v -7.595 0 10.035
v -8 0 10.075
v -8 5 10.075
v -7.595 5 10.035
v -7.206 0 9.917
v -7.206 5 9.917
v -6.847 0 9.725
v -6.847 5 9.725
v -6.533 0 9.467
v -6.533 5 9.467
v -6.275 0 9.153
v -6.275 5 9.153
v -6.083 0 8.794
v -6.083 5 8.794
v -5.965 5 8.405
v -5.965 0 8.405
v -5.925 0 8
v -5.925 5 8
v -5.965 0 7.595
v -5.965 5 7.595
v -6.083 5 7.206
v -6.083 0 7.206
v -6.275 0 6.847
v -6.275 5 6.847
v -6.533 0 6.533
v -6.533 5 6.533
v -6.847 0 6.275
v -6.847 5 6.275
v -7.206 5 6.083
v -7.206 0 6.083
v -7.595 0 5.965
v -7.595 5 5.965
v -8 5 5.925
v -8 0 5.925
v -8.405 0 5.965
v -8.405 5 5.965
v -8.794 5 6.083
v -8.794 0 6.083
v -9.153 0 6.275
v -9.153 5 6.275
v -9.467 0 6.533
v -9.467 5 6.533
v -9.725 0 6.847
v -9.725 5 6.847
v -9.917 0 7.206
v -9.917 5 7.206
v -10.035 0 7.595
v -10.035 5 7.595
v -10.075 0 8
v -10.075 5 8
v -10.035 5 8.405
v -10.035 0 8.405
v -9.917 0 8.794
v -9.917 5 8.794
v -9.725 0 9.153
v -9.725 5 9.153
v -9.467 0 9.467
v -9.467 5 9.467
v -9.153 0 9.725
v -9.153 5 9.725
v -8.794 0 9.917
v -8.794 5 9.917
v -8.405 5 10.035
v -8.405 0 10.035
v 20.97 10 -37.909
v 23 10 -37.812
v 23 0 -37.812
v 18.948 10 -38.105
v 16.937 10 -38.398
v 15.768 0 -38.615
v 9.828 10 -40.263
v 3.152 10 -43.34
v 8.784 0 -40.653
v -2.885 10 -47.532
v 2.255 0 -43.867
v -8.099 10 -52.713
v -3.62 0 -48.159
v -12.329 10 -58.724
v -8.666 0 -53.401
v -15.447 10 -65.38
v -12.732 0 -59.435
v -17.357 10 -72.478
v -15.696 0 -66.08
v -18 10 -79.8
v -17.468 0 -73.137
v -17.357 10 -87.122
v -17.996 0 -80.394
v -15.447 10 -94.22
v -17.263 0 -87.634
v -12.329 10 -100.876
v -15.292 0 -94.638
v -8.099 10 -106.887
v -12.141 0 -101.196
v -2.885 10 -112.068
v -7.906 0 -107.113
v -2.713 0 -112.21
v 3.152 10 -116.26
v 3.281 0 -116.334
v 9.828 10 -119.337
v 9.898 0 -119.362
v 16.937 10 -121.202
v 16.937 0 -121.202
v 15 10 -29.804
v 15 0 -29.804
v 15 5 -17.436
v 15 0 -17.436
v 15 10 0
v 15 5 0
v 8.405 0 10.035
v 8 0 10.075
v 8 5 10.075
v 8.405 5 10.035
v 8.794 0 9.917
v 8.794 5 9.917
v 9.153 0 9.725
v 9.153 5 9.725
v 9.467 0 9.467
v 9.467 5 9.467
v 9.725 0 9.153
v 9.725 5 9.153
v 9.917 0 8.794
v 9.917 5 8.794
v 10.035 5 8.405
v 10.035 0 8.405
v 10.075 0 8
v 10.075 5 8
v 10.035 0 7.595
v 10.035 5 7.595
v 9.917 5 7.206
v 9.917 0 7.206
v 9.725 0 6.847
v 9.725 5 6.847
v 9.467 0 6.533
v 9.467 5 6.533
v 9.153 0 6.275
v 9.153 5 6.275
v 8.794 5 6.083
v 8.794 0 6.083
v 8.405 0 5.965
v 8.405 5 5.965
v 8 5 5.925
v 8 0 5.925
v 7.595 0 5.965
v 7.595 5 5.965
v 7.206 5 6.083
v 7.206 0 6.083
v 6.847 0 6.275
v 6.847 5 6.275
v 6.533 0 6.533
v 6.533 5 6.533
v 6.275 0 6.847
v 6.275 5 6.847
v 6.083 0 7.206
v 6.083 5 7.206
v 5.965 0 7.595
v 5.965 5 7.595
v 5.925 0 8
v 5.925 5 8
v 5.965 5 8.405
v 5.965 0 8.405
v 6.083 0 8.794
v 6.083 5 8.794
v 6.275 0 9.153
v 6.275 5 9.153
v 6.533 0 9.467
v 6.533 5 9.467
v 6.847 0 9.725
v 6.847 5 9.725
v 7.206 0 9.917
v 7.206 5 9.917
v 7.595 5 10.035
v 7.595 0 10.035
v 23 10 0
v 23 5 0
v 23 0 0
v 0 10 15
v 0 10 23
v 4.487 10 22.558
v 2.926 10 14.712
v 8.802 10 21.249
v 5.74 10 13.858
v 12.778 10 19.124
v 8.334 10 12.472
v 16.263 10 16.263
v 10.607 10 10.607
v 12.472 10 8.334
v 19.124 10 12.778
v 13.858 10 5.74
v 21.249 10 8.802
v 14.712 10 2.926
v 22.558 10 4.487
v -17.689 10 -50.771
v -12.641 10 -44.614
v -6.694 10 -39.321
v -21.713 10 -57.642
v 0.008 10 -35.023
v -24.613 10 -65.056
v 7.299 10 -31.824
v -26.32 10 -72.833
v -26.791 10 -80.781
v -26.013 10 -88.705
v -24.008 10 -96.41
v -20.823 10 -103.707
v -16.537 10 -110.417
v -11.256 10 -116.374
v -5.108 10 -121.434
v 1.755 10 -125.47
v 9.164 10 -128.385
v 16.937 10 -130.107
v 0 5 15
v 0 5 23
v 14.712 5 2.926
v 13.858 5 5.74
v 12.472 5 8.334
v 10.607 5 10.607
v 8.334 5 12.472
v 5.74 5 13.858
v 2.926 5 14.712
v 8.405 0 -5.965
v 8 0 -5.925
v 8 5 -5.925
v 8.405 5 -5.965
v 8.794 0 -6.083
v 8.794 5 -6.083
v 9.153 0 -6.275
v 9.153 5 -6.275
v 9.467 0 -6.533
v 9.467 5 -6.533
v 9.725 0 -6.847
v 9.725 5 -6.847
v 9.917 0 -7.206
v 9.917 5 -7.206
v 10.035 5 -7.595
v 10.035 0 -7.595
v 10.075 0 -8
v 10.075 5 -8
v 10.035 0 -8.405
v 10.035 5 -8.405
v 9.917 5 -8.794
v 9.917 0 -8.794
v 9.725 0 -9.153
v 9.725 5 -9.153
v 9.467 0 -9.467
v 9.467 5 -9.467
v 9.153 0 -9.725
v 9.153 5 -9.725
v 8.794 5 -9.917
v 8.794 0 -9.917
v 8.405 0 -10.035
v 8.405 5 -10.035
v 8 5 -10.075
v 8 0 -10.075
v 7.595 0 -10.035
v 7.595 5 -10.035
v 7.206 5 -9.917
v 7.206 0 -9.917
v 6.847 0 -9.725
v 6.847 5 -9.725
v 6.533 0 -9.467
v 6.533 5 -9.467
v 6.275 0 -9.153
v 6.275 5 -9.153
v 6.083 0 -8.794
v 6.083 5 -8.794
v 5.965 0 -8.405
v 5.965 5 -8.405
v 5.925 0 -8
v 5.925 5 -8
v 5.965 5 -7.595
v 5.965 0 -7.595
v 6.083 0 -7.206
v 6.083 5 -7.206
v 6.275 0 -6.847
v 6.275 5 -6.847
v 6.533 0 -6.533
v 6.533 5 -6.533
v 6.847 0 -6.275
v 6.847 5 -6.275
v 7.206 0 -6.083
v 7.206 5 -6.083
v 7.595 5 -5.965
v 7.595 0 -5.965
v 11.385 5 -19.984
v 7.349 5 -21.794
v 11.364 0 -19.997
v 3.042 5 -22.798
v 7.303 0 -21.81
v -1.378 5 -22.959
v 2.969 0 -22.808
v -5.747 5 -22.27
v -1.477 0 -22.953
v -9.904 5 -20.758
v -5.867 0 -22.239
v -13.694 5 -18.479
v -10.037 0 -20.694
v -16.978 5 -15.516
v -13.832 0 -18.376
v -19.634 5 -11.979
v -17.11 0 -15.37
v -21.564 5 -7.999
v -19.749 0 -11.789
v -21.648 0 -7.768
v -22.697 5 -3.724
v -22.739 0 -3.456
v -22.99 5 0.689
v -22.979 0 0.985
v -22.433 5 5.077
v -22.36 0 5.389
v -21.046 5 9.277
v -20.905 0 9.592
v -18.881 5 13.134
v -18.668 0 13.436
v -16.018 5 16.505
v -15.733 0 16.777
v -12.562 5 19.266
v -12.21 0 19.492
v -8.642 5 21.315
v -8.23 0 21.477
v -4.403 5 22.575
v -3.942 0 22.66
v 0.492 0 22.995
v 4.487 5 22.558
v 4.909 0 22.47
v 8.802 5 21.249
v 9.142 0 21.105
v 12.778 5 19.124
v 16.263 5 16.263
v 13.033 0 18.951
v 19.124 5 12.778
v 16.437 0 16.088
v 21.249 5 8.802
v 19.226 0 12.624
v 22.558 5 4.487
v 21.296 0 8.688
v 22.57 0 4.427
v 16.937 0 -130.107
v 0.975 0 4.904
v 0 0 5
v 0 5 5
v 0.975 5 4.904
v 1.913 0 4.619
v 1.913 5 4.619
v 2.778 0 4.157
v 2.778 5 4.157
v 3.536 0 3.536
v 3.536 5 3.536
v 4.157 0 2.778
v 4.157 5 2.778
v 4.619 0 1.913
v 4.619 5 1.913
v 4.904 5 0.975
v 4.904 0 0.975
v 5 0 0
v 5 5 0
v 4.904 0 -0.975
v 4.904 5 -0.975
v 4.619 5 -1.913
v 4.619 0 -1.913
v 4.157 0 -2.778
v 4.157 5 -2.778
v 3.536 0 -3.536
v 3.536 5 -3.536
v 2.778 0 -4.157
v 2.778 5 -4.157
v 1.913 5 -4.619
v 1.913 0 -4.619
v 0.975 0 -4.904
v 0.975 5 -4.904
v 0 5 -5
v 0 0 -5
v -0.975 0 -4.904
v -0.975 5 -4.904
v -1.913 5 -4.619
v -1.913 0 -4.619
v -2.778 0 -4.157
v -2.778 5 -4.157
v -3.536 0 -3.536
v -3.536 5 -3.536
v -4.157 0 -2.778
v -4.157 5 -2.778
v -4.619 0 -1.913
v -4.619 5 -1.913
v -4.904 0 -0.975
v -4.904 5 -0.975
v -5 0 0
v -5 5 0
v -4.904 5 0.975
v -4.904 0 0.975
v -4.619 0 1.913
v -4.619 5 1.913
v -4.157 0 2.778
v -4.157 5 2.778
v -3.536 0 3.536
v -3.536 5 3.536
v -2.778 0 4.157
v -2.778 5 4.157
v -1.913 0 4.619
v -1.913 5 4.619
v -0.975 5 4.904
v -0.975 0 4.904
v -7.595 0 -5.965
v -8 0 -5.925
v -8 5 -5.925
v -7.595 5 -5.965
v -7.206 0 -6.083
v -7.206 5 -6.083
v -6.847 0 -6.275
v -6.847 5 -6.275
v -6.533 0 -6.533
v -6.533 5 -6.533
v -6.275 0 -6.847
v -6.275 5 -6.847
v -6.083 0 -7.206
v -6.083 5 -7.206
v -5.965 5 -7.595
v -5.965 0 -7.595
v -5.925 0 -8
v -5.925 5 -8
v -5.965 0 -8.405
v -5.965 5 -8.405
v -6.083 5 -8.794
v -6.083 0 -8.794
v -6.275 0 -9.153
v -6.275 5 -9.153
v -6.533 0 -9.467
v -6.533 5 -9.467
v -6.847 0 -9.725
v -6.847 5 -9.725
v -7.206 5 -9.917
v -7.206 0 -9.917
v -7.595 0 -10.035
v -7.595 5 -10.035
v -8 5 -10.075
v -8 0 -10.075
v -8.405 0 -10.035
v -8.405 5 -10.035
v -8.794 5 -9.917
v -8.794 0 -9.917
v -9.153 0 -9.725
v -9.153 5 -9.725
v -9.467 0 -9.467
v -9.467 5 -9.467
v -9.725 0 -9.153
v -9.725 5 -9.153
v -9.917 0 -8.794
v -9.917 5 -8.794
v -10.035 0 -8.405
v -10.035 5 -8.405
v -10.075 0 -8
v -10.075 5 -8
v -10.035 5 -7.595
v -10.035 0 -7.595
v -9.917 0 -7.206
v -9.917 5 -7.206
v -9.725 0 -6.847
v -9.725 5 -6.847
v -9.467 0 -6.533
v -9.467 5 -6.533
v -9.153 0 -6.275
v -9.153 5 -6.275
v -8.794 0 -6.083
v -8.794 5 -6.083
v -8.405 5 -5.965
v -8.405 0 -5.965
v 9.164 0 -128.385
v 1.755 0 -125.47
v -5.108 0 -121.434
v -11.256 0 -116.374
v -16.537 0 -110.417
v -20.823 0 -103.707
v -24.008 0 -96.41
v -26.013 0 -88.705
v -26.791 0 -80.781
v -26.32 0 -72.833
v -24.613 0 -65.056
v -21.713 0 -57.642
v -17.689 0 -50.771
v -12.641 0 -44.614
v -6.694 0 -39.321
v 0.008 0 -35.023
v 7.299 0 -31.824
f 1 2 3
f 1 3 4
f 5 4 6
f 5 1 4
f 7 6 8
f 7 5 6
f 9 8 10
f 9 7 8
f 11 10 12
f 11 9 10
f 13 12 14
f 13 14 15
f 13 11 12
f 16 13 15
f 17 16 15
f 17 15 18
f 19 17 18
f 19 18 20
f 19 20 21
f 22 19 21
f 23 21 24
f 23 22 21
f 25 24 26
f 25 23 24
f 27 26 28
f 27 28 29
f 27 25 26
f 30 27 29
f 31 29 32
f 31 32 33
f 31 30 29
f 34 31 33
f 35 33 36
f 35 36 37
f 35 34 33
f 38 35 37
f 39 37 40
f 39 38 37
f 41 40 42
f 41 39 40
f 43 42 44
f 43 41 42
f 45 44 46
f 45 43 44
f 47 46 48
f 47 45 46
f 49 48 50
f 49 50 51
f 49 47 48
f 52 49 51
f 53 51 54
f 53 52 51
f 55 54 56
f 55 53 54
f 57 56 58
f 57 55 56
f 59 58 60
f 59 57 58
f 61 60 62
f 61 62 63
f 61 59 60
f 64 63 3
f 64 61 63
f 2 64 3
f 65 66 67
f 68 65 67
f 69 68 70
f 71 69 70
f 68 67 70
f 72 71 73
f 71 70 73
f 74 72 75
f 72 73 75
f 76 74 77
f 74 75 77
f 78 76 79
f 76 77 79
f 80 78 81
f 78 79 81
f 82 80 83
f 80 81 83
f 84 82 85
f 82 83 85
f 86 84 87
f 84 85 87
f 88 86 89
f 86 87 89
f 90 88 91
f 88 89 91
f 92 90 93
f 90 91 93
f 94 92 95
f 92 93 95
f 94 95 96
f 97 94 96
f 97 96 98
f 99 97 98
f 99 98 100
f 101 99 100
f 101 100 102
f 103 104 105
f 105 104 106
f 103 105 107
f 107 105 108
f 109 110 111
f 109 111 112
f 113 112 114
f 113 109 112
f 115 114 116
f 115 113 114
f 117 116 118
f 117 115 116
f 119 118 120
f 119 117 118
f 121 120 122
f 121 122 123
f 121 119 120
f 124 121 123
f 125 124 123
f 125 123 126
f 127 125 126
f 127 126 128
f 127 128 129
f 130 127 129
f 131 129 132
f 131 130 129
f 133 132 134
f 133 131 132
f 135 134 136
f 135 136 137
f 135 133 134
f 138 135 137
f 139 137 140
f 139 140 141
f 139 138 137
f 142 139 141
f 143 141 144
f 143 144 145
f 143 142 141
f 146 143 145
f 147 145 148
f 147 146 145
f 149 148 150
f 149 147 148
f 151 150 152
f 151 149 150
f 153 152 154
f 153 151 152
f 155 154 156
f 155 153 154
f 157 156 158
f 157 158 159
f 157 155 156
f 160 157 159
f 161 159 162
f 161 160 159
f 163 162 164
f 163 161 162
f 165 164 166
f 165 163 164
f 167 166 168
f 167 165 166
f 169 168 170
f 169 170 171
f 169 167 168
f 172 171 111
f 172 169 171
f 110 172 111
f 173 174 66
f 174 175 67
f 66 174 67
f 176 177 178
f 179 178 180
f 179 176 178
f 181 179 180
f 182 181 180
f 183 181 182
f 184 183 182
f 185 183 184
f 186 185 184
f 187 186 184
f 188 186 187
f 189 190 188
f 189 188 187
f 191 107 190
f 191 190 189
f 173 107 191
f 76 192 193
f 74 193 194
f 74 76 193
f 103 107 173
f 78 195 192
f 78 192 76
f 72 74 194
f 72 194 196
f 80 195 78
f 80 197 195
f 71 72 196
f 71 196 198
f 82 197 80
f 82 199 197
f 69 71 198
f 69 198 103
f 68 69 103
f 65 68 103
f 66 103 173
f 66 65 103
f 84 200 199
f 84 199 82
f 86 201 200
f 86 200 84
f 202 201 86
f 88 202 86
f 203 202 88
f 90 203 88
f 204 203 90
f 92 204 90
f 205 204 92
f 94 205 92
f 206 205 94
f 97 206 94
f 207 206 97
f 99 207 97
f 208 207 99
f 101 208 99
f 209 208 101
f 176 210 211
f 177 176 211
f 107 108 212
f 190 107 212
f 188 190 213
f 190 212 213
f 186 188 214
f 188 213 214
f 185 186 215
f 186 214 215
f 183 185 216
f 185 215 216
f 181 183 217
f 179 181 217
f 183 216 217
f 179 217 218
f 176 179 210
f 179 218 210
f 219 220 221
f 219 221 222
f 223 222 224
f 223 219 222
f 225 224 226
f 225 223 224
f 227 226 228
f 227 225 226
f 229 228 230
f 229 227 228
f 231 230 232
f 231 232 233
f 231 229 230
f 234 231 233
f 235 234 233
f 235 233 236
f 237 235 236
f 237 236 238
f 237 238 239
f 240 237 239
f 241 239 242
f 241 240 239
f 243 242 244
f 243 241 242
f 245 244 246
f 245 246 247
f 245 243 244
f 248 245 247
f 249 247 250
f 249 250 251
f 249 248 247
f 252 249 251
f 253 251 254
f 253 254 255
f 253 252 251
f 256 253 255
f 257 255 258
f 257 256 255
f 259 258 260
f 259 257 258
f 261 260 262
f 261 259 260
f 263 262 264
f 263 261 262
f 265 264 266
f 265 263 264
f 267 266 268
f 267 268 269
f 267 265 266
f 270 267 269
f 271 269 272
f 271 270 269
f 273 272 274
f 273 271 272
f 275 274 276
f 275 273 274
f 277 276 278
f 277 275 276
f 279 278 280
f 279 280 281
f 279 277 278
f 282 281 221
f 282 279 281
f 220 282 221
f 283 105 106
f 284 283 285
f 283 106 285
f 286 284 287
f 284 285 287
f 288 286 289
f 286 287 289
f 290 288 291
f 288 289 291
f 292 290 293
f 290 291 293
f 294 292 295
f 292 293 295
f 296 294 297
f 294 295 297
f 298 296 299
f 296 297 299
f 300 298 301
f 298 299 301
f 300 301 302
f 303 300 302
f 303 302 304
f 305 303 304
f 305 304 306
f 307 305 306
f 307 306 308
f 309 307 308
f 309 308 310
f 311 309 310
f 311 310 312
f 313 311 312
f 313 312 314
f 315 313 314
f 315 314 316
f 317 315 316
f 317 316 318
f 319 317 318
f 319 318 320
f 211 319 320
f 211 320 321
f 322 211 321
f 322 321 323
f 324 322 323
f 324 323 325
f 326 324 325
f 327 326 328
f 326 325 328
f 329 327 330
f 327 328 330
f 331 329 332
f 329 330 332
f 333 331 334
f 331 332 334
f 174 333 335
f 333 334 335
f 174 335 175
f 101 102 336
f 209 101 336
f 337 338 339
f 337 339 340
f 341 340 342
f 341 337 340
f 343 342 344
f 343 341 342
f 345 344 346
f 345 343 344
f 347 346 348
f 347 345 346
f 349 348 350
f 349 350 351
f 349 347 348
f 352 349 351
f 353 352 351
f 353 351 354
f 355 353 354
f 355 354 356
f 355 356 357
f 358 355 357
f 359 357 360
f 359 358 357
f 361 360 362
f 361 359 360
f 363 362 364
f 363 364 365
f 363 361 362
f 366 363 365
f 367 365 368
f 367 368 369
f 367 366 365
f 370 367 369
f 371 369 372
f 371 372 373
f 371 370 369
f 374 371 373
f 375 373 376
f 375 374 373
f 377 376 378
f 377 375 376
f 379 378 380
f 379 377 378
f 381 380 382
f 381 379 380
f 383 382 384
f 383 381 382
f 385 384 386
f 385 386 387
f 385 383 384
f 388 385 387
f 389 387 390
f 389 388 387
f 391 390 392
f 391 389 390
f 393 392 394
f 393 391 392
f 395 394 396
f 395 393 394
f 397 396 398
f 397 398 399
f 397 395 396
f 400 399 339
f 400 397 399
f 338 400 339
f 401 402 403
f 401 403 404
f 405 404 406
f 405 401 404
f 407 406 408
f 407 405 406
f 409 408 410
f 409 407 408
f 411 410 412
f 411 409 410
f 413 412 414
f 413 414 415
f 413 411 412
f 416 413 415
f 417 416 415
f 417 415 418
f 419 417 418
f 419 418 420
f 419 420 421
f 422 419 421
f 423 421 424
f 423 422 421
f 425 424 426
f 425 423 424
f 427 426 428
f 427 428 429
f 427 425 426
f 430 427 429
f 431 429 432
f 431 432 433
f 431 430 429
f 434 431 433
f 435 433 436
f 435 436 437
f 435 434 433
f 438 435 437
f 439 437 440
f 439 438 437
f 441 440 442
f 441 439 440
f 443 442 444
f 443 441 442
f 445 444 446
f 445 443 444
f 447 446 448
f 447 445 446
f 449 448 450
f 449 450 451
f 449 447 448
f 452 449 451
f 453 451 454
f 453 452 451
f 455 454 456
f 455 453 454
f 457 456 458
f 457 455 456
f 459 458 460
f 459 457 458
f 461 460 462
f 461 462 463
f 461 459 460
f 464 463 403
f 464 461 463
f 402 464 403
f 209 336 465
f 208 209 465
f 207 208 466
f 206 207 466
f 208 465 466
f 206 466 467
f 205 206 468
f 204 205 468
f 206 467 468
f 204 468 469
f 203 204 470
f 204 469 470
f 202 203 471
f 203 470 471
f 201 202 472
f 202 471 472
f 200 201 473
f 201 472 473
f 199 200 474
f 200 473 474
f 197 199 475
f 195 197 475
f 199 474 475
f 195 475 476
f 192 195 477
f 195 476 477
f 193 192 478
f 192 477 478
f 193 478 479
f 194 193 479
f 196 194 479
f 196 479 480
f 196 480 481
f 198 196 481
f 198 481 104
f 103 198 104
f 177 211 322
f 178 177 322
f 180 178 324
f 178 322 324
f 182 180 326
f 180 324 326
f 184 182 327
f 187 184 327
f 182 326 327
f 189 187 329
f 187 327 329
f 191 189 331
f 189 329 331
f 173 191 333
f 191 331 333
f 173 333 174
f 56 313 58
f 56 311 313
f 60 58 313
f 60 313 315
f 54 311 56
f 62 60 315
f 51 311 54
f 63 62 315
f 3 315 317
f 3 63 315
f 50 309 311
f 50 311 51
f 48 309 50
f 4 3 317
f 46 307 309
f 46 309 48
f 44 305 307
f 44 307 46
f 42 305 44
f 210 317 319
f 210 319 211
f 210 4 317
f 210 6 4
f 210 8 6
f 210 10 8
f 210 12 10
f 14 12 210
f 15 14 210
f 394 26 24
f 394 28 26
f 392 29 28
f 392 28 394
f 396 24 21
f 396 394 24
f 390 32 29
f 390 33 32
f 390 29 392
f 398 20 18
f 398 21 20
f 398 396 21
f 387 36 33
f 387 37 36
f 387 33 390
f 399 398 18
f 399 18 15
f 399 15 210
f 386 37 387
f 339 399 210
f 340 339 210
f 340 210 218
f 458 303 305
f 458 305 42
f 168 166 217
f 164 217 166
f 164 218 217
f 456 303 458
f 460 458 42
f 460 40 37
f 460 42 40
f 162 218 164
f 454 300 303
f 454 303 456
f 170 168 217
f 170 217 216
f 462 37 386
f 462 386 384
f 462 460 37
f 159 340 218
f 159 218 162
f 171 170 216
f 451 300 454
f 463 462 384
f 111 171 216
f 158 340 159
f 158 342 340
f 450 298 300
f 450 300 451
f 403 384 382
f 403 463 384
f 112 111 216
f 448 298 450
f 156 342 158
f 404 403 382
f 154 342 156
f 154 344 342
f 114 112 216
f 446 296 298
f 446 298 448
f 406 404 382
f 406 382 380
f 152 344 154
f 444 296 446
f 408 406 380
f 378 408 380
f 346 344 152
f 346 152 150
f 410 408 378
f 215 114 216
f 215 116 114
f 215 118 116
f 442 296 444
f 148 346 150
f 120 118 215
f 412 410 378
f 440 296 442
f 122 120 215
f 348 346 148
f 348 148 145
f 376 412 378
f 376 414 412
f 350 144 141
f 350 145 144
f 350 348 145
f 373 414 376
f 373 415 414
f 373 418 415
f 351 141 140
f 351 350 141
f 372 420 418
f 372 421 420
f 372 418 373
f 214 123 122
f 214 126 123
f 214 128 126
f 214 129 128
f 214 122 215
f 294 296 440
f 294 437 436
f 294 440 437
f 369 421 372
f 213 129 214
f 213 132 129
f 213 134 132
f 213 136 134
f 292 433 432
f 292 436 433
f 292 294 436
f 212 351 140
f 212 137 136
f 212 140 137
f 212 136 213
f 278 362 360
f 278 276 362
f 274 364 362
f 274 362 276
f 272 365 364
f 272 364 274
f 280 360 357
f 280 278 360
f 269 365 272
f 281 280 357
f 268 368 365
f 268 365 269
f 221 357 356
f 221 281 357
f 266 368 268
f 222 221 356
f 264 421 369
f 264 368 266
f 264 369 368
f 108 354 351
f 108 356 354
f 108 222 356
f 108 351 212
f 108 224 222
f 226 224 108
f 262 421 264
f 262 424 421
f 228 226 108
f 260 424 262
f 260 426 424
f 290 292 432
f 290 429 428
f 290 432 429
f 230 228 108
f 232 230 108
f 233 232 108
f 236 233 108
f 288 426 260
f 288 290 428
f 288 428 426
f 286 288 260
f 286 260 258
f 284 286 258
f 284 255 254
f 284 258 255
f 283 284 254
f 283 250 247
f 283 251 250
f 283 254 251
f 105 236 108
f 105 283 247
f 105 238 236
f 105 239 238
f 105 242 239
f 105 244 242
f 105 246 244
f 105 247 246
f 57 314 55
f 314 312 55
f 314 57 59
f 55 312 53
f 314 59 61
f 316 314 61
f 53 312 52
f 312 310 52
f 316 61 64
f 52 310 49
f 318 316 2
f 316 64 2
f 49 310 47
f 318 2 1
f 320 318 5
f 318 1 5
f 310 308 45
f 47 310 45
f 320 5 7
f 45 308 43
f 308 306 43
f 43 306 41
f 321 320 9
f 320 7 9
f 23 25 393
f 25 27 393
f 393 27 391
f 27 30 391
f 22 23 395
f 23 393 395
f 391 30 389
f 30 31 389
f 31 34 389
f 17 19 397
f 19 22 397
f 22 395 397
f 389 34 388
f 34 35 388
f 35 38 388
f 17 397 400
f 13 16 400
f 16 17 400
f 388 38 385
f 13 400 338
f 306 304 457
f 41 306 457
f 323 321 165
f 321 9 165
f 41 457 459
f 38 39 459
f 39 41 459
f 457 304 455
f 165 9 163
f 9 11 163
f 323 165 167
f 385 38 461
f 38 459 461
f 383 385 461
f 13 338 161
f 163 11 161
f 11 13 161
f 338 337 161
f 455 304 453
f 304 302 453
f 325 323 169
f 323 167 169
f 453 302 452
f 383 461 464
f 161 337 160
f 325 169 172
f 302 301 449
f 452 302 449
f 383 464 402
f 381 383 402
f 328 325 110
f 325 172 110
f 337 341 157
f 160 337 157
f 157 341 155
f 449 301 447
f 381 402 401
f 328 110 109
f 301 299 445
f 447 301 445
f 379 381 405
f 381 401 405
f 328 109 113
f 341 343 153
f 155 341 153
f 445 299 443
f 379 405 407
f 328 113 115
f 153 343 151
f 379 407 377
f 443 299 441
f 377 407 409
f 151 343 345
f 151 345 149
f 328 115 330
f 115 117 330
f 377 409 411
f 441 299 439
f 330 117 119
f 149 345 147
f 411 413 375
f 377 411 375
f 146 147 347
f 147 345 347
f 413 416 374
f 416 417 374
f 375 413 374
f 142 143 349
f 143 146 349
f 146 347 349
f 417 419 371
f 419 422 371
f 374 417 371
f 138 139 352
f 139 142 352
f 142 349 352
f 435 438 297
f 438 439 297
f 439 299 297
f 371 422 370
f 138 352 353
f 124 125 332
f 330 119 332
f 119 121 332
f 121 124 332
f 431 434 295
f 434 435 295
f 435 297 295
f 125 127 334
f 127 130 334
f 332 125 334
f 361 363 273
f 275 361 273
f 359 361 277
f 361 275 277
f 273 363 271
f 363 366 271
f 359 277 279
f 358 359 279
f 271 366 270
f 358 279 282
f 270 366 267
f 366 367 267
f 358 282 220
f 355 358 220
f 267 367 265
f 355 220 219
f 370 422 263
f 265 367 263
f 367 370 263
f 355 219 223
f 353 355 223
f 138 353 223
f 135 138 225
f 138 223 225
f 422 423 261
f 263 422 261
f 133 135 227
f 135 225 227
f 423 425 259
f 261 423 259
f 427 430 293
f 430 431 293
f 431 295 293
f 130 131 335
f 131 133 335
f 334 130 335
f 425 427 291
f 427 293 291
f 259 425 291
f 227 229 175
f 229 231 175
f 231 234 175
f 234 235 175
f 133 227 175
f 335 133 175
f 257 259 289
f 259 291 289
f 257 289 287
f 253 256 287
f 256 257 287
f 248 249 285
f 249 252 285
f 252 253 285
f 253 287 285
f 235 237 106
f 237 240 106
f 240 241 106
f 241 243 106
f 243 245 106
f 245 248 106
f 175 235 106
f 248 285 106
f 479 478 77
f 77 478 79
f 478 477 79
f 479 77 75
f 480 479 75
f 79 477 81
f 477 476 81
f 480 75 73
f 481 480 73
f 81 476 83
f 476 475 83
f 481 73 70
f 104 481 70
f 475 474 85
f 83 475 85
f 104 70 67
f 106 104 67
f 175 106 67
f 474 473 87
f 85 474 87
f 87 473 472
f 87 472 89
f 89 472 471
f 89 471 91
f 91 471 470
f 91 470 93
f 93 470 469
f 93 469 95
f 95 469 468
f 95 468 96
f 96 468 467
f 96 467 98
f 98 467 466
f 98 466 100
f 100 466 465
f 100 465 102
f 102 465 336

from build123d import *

# Parameters (mm, degrees)
SKETCH1_R           = 5
SKETCH1_R_2         = 2.075
BOSS_EXTRUDE1_DEPTH = 5
BOSS_EXTRUDE2_DEPTH = 10


with BuildPart() as part:
    # Sketch1 → Boss-Extrude1 (new body)
    with BuildSketch(Plane(origin=(0, 0, 0), x_dir=(1, 0, 0), z_dir=(0, 1, 0))):
        with BuildLine():
            ThreePointArc((23, 37.81190645), (-17.889435034, 76.754473357), (16.937219731, 121.201897721))
            Line((16.937219731, 121.201897721), (16.937219731, 130.106631122))
            ThreePointArc((16.937219731, 130.106631122), (-26.790527996, 80.780951543), (15, 29.80360013))
            Line((15, 29.80360013), (15, 17.435595774))
            ThreePointArc((15, 17.435595774), (-20.90454496, -9.591663047), (23, 0))
            Line((23, 0), (23, 37.81190645))
        make_face()
        Circle(SKETCH1_R, mode=Mode.SUBTRACT)
        with Locations((8, 8)):
            Circle(SKETCH1_R_2, mode=Mode.SUBTRACT)
        with Locations((-8, -8)):
            Circle(SKETCH1_R_2, mode=Mode.SUBTRACT)
        with Locations((-8, 8)):
            Circle(SKETCH1_R_2, mode=Mode.SUBTRACT)
        with Locations((8, -8)):
            Circle(SKETCH1_R_2, mode=Mode.SUBTRACT)
    extrude(amount=BOSS_EXTRUDE1_DEPTH)

    # Sketch1<3> → Boss-Extrude2 (add)
    with BuildSketch(Plane(origin=(0, 0, 0), x_dir=(1, 0, 0), z_dir=(0, 1, 0))):
        with BuildLine():
            Line((23, 23), (23, 29))
            Line((23, 29), (23, 29.009843473))
            Line((23, 29.009843473), (23, 37.81190645))
            ThreePointArc((23, 37.81190645), (19.957969223, 37.994952611), (16.937219731, 38.398102279))
            ThreePointArc((16.937219731, 38.398102279), (-18, 79.8), (16.937219731, 121.201897721))
            Line((16.937219731, 121.201897721), (16.937219731, 130.106631122))
            ThreePointArc((16.937219731, 130.106631122), (-26.790527996, 80.780951543), (15, 29.80360013))
            Line((15, 29.80360013), (15, 23))
            Line((15, 23), (15, 17.435595774))
            Line((15, 17.435595774), (15, 0))
            ThreePointArc((15, 0), (10.606601718, -10.606601718), (0, -15))
            Line((0, -15), (0, -23))
            ThreePointArc((0, -23), (16.263455967, -16.263455967), (23, 0))
            Line((23, 0), (23, 23))
        make_face()
    extrude(amount=BOSS_EXTRUDE2_DEPTH)


solid = part.part
